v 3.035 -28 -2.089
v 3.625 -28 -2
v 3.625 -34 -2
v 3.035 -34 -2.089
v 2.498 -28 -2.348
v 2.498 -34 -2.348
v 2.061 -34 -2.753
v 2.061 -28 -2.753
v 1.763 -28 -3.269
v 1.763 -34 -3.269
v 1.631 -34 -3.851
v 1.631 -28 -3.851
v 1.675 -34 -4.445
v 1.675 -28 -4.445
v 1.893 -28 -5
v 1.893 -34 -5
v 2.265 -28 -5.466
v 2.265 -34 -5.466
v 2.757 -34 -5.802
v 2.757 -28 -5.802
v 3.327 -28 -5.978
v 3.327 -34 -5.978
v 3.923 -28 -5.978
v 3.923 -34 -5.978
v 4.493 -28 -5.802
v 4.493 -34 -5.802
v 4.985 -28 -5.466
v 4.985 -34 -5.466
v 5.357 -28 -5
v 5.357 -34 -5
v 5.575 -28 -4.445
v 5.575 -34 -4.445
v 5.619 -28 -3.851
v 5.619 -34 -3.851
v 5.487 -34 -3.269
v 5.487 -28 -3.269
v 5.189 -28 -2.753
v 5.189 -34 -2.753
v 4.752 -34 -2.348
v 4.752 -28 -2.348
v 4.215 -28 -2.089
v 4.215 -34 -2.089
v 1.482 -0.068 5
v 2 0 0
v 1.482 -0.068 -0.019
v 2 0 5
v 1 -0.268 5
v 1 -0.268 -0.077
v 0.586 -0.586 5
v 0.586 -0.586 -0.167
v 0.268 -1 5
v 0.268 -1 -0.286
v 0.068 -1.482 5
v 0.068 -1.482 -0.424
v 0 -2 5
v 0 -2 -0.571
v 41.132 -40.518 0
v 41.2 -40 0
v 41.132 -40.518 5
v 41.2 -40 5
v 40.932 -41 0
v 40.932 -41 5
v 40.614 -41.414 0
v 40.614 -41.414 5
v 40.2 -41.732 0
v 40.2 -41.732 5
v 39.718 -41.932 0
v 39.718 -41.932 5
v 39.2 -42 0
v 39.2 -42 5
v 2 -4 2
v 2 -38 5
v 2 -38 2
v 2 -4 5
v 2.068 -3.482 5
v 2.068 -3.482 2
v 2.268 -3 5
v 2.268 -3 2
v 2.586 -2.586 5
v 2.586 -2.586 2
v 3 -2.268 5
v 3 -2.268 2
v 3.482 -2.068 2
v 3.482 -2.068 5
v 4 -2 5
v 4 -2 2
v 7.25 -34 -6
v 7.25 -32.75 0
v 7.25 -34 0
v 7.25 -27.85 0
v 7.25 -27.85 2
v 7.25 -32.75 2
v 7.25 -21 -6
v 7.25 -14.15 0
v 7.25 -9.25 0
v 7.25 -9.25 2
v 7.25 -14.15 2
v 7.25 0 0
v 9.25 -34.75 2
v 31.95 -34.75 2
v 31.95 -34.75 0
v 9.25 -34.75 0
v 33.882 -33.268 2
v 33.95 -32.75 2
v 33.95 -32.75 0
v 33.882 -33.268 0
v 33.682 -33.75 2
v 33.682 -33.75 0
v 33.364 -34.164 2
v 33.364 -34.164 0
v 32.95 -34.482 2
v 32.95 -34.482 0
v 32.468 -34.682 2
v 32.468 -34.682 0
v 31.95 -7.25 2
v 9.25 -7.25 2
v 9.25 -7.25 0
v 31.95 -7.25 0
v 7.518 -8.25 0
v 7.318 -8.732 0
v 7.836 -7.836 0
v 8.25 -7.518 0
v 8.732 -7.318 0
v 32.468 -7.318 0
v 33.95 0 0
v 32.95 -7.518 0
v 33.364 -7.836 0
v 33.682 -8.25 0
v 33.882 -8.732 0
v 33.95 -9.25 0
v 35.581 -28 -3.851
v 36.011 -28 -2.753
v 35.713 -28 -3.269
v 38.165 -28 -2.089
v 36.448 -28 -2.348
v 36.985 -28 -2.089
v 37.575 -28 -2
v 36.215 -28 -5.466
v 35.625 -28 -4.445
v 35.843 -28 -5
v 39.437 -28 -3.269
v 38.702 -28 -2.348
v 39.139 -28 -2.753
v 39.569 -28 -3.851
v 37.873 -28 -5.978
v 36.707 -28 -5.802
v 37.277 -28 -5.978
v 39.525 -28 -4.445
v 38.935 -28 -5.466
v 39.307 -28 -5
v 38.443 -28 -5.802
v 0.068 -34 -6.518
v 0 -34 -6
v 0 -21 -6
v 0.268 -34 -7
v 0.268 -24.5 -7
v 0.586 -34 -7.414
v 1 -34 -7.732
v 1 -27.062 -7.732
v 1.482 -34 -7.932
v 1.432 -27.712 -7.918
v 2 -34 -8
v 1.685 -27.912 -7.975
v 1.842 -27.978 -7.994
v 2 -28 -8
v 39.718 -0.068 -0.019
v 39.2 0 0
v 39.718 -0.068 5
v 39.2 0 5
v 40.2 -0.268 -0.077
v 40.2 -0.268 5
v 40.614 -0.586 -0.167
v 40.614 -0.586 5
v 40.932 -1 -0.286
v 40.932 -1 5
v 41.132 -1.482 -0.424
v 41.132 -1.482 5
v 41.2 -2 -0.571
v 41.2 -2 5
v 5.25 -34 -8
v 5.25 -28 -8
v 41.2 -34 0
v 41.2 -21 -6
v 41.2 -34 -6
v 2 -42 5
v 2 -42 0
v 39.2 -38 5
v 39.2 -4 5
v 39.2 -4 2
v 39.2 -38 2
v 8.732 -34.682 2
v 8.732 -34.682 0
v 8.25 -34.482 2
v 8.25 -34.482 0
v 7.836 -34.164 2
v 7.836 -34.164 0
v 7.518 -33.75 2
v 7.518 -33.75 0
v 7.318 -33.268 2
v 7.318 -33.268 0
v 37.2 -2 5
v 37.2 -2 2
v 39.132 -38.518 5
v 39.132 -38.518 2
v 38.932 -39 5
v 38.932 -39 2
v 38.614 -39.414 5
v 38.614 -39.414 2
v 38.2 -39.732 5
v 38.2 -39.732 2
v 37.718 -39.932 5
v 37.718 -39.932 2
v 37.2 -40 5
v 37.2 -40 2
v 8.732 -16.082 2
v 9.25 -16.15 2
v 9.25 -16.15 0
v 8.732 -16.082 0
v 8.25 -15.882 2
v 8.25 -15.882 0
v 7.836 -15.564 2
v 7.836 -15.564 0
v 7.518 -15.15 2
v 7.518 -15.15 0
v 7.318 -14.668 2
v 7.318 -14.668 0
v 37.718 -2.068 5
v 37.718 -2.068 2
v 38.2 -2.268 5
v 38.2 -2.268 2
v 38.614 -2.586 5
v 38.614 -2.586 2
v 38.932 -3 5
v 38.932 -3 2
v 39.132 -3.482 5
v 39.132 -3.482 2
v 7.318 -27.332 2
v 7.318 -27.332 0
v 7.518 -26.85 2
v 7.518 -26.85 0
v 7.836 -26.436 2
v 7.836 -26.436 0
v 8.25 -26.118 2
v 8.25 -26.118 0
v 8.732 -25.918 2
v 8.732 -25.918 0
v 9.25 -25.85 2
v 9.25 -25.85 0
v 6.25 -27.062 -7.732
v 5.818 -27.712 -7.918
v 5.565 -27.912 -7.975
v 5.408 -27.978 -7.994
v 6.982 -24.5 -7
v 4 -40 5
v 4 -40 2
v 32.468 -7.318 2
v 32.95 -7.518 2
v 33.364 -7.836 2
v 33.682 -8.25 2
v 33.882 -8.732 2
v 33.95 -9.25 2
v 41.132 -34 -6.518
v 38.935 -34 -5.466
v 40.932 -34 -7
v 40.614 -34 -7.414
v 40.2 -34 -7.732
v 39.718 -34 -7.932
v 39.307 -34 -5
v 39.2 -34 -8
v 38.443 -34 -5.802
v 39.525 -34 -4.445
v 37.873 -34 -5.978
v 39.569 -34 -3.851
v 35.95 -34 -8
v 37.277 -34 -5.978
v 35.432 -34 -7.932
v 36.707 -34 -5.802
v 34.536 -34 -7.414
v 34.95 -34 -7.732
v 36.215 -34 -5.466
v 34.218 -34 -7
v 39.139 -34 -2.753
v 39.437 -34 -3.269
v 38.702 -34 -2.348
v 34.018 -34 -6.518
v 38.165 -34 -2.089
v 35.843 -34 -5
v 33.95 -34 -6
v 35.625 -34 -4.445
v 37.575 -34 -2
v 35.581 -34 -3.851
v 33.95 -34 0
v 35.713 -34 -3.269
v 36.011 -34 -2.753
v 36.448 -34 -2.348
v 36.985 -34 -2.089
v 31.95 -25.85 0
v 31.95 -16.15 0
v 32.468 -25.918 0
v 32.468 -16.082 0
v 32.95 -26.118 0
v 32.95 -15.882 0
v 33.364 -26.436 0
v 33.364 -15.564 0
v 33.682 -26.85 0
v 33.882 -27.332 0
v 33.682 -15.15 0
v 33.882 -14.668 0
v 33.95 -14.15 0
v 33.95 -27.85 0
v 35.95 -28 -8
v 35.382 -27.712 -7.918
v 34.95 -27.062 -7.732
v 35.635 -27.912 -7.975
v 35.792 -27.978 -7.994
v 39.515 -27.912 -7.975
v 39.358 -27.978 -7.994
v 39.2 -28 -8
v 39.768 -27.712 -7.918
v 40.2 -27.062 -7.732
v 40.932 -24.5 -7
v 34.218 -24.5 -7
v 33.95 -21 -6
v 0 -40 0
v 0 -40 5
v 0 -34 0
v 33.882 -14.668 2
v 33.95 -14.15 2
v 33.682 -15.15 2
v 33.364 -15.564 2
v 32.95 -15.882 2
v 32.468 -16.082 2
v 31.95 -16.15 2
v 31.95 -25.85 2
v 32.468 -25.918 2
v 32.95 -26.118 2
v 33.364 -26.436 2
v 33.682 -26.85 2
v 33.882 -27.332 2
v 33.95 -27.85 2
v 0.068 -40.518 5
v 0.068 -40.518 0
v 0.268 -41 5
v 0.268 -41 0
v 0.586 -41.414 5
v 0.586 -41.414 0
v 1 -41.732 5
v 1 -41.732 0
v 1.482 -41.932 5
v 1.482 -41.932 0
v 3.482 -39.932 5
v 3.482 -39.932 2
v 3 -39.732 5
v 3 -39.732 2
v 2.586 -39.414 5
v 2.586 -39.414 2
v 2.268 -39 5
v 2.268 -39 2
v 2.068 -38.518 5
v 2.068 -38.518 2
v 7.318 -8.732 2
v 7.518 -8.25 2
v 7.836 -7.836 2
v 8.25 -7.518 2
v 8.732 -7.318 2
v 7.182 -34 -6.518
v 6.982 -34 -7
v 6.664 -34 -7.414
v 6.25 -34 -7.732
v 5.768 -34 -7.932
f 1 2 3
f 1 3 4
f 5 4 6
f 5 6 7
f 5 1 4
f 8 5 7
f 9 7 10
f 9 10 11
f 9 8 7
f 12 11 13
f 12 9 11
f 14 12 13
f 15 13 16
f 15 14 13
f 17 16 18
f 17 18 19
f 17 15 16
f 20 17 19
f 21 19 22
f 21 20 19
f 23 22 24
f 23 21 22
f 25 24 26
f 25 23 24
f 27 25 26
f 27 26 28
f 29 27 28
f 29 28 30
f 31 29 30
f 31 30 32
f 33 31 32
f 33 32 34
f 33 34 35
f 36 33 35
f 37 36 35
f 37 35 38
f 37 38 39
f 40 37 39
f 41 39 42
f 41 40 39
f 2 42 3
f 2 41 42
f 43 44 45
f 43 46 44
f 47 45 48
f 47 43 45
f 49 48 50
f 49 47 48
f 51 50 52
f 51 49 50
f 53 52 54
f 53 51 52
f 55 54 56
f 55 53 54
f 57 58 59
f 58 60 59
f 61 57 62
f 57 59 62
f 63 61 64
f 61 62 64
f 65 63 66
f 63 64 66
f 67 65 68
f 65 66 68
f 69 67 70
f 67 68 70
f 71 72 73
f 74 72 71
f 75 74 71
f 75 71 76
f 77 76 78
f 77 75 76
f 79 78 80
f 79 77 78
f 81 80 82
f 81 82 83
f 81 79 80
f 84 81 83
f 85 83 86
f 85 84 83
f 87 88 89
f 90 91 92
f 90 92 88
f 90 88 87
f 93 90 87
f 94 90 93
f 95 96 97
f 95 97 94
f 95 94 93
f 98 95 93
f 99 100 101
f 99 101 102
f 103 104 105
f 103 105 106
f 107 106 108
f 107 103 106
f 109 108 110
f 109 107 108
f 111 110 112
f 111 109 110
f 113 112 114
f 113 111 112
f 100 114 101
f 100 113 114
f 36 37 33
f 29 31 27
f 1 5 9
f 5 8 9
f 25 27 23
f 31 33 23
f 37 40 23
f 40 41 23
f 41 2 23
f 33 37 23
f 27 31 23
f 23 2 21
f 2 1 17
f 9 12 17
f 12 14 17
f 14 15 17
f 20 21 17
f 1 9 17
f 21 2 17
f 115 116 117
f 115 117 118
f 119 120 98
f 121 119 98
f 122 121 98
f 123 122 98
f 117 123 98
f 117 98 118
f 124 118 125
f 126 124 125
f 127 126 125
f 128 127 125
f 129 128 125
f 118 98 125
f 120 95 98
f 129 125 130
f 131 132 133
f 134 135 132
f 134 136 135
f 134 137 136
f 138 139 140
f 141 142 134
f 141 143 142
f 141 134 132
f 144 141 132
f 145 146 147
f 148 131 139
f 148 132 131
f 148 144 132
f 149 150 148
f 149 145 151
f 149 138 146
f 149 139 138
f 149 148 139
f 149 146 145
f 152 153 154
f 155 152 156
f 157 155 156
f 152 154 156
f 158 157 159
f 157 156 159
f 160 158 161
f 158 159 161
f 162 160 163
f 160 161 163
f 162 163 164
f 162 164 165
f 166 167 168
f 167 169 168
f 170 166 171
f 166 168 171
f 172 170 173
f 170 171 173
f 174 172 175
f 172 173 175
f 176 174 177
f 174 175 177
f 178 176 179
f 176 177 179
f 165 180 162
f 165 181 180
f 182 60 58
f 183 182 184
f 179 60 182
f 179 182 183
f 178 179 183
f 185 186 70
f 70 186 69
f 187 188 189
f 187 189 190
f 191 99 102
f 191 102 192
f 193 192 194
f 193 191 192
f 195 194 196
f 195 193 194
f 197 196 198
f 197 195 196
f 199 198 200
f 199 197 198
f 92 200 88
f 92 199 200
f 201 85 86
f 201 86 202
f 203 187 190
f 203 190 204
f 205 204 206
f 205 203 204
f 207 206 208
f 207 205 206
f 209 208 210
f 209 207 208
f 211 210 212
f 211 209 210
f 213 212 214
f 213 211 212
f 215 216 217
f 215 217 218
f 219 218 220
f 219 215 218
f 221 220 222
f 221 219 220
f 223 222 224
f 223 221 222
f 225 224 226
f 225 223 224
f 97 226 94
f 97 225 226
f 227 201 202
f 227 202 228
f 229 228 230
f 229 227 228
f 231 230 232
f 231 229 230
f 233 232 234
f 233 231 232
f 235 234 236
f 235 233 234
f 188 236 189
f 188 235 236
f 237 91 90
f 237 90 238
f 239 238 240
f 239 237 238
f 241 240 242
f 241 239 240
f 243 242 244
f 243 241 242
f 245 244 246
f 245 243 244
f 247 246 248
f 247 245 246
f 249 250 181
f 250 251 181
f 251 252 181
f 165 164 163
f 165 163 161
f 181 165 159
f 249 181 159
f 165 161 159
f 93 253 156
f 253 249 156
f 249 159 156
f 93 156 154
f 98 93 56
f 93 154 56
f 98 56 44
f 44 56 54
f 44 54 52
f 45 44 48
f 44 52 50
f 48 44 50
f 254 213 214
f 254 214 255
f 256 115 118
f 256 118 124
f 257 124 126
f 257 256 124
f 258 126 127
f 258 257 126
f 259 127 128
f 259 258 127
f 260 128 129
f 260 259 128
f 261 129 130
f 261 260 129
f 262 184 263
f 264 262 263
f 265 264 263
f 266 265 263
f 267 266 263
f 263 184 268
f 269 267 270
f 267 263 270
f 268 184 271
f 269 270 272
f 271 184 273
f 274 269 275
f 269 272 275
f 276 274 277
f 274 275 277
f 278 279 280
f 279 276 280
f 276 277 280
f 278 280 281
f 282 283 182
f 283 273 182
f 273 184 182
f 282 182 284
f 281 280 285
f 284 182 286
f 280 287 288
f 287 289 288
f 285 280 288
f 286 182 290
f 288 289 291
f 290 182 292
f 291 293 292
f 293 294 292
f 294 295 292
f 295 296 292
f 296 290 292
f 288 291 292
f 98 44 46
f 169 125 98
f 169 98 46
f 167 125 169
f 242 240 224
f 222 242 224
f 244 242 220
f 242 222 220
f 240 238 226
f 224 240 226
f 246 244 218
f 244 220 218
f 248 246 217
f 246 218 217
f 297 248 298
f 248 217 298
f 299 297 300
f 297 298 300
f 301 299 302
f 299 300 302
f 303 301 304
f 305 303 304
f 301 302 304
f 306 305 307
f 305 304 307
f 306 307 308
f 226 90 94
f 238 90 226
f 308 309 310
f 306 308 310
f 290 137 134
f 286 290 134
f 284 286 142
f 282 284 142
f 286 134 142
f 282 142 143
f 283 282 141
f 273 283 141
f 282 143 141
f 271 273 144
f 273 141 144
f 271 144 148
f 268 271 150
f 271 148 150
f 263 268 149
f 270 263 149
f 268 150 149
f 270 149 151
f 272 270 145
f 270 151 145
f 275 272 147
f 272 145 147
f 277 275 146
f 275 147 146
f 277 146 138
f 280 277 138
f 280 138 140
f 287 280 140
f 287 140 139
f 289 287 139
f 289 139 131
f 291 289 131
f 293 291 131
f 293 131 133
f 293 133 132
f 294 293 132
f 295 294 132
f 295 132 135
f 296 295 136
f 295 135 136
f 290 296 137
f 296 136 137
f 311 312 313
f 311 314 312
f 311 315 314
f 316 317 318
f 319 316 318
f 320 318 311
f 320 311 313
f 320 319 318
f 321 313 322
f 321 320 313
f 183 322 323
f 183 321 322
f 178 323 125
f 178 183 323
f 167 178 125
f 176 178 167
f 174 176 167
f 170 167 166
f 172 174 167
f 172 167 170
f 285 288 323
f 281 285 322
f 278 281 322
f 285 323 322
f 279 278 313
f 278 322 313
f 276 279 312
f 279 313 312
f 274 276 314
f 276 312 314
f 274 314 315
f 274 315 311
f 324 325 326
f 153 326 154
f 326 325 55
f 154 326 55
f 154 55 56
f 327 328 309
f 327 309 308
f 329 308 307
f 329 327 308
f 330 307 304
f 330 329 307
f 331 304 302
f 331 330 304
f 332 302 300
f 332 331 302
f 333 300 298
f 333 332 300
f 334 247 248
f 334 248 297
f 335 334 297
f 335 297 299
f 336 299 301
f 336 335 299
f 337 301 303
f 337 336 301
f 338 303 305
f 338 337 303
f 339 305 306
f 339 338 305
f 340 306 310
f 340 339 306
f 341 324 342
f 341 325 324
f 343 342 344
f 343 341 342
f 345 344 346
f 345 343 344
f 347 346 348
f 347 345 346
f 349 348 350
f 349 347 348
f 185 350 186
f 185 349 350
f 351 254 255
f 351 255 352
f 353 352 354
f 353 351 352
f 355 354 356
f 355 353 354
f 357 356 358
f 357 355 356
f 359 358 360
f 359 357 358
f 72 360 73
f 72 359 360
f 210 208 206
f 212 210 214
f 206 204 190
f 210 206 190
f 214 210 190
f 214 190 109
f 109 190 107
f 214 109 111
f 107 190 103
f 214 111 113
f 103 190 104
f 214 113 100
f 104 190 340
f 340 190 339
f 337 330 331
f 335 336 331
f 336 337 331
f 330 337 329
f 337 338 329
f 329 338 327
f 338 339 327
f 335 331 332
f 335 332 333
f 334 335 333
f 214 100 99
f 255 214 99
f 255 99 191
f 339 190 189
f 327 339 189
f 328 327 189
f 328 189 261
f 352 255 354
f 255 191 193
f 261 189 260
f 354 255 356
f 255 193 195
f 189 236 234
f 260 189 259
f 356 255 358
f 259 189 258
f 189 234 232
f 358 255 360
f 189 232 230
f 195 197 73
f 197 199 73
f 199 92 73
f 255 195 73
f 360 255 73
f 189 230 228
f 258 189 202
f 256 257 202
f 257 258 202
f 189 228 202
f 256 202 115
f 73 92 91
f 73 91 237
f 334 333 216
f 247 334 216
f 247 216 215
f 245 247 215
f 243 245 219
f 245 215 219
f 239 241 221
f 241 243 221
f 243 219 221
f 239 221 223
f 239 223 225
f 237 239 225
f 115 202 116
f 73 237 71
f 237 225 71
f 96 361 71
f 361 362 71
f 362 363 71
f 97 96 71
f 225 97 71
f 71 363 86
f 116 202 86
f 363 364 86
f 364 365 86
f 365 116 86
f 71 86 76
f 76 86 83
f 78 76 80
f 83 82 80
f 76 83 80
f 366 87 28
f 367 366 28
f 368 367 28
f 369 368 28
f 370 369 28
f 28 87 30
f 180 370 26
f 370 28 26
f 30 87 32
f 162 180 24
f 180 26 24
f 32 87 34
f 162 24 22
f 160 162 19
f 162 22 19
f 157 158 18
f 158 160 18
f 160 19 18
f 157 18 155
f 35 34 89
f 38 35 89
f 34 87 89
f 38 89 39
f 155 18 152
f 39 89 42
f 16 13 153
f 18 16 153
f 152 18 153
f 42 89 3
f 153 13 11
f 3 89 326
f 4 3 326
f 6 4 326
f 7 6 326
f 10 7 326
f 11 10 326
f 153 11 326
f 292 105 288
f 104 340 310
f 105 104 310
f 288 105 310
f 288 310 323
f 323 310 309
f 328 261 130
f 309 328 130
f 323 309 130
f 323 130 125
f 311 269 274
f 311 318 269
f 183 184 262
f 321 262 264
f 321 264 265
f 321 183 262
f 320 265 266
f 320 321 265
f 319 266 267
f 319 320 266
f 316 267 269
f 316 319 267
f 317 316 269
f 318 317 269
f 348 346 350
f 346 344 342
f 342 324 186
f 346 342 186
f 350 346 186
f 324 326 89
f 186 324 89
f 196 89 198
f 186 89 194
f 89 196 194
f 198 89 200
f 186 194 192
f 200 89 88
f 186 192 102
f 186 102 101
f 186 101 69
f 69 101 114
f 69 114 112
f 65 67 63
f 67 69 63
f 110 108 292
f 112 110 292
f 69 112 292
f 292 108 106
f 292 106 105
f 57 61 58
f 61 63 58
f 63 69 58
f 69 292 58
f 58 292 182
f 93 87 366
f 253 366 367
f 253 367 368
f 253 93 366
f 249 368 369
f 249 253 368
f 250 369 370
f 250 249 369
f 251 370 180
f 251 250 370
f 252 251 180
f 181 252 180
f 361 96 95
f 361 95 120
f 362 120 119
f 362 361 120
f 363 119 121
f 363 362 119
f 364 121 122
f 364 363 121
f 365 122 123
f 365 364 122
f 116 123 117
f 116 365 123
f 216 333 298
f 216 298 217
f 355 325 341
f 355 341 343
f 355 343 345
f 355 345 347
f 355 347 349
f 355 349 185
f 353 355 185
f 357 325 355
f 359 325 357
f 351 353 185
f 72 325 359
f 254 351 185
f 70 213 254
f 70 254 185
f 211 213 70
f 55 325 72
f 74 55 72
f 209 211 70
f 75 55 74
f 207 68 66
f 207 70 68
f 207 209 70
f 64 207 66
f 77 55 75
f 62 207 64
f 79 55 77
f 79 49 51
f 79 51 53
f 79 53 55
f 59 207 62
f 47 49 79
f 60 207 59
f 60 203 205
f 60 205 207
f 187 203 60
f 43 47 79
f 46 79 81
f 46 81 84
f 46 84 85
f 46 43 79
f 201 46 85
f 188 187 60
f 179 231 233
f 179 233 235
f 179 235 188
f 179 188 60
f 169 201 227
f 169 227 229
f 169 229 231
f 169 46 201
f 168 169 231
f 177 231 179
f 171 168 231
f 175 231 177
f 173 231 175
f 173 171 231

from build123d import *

# Parameters (mm, degrees)
SKETCH1_W           = 41.2
SKETCH1_H           = 42
BOSS_EXTRUDE1_DEPTH = 5
CUT_EXTRUDE1_DEPTH  = 3
CUT_EXTRUDE2_DEPTH  = 2
SKETCH8_W           = 7.25
SKETCH8_H           = 6
BOSS_EXTRUDE4_DEPTH = 8
SKETCH9_W           = 7.25
SKETCH9_H           = 6
BOSS_EXTRUDE5_DEPTH = 8
SKETCH12_R          = 2
CUT_EXTRUDE4_DEPTH  = 6
BOSS_EXTRUDE6_DEPTH = 7.25
FILLET1_R           = 2
FILLET2_R           = 2


with BuildPart() as part:
    # Sketch1 → Boss-Extrude1 (new body)
    with BuildSketch(Plane.XY):
        with Locations((20.6, -21)):
            Rectangle(SKETCH1_W, SKETCH1_H)
    extrude(amount=BOSS_EXTRUDE1_DEPTH)

    # Sketch2 → Cut-Extrude1 (cut)
    with BuildSketch(Plane.XY.offset(5)):
        with BuildLine():
            Line((4, -2), (37.2, -2))
            ThreePointArc((37.2, -2), (38.614213562, -2.585786438), (39.2, -4))
            Line((39.2, -4), (39.2, -38))
            ThreePointArc((39.2, -38), (38.614213562, -39.414213562), (37.2, -40))
            Line((37.2, -40), (4, -40))
            ThreePointArc((4, -40), (2.585786438, -39.414213562), (2, -38))
            Line((2, -38), (2, -4))
            ThreePointArc((2, -4), (2.585786438, -2.585786438), (4, -2))
        make_face()
    extrude(amount=-CUT_EXTRUDE1_DEPTH, mode=Mode.SUBTRACT)

    # Sketch3 → Cut-Extrude2 (cut)
    with BuildSketch(Plane.XY.offset(2)):
        with BuildLine():
            Line((9.25, -7.25), (31.95, -7.25))
            ThreePointArc((31.95, -7.25), (33.364213562, -7.835786438), (33.95, -9.25))
            Line((33.95, -9.25), (33.95, -14.15))
            ThreePointArc((33.95, -14.15), (33.364213562, -15.564213562), (31.95, -16.15))
            Line((31.95, -16.15), (9.25, -16.15))
            ThreePointArc((9.25, -16.15), (7.835786438, -15.564213562), (7.25, -14.15))
            Line((7.25, -14.15), (7.25, -9.25))
            ThreePointArc((7.25, -9.25), (7.835786438, -7.835786438), (9.25, -7.25))
        make_face()
        with BuildLine():
            Line((9.25, -25.85), (31.95, -25.85))
            ThreePointArc((31.95, -25.85), (33.364213562, -26.435786438), (33.95, -27.85))
            Line((33.95, -27.85), (33.95, -32.75))
            ThreePointArc((33.95, -32.75), (33.364213562, -34.164213562), (31.95, -34.75))
            Line((31.95, -34.75), (9.25, -34.75))
            ThreePointArc((9.25, -34.75), (7.835786438, -34.164213562), (7.25, -32.75))
            Line((7.25, -32.75), (7.25, -27.85))
            ThreePointArc((7.25, -27.85), (7.835786438, -26.435786438), (9.25, -25.85))
        make_face()
    extrude(amount=-CUT_EXTRUDE2_DEPTH, mode=Mode.SUBTRACT)

    # Sketch8 → Boss-Extrude4 (add)
    with BuildSketch(Plane(origin=(0, 0, 0), x_dir=(-1, 0, 0), z_dir=(0, 0, -1))):
        with Locations((-37.575, -31)):
            Rectangle(SKETCH8_W, SKETCH8_H)
    extrude(amount=BOSS_EXTRUDE4_DEPTH)

    # Sketch9 → Boss-Extrude5 (add)
    with BuildSketch(Plane(origin=(0, 0, 0), x_dir=(-1, 0, 0), z_dir=(0, 0, -1))):
        with Locations((-3.625, -31)):
            Rectangle(SKETCH9_W, SKETCH9_H)
    extrude(amount=BOSS_EXTRUDE5_DEPTH)

    # Sketch12 → Cut-Extrude4 (cut)
    with BuildSketch(Plane(origin=(0, -28, 0), x_dir=(1, 0, 0), z_dir=(0, 1, 0))):
        with Locations(Location((37.575, 4, 0), (0, 0, 270))):
            Circle(SKETCH12_R)
    cut_extrude4 = extrude(amount=-CUT_EXTRUDE4_DEPTH, mode=Mode.SUBTRACT)

    # Sketch13 → Boss-Extrude6 (add)
    with BuildSketch(Plane(origin=(41.2, 0, 0), x_dir=(0, 0, -1), z_dir=(1, 0, 0))):
        Polygon((8, -28), (0, 0), (0, -28), align=None)
    boss_extrude6 = extrude(amount=-BOSS_EXTRUDE6_DEPTH)

    # Mirror2: Cut-Extrude4, Boss-Extrude6 across plane
    add(cut_extrude4.mirror(Plane(origin=(20.6, 0, 0), x_dir=(0, 0, 1), z_dir=(1, 0, 0))), mode=Mode.SUBTRACT)
    add(boss_extrude6.mirror(Plane(origin=(20.6, 0, 0), x_dir=(0, 0, 1), z_dir=(1, 0, 0))))

    # Fillet1
    fillet1_edges = [part.edges().sort_by_distance(p)[0] for p in [
        (0, 0, 2.5),
        (41.2, 0, 2.5),
        (41.2, -42, 2.5),
        (0, -42, 2.5),
    ]]
    fillet(fillet1_edges, radius=FILLET1_R)

    # Fillet2
    fillet2_edges = [part.edges().sort_by_distance(p)[0] for p in [
        (0, -31, -8),
        (7.25, -31, -8),
        (41.2, -31, -8),
        (33.95, -31, -8),
    ]]
    fillet(fillet2_edges, radius=FILLET2_R)


solid = part.part
